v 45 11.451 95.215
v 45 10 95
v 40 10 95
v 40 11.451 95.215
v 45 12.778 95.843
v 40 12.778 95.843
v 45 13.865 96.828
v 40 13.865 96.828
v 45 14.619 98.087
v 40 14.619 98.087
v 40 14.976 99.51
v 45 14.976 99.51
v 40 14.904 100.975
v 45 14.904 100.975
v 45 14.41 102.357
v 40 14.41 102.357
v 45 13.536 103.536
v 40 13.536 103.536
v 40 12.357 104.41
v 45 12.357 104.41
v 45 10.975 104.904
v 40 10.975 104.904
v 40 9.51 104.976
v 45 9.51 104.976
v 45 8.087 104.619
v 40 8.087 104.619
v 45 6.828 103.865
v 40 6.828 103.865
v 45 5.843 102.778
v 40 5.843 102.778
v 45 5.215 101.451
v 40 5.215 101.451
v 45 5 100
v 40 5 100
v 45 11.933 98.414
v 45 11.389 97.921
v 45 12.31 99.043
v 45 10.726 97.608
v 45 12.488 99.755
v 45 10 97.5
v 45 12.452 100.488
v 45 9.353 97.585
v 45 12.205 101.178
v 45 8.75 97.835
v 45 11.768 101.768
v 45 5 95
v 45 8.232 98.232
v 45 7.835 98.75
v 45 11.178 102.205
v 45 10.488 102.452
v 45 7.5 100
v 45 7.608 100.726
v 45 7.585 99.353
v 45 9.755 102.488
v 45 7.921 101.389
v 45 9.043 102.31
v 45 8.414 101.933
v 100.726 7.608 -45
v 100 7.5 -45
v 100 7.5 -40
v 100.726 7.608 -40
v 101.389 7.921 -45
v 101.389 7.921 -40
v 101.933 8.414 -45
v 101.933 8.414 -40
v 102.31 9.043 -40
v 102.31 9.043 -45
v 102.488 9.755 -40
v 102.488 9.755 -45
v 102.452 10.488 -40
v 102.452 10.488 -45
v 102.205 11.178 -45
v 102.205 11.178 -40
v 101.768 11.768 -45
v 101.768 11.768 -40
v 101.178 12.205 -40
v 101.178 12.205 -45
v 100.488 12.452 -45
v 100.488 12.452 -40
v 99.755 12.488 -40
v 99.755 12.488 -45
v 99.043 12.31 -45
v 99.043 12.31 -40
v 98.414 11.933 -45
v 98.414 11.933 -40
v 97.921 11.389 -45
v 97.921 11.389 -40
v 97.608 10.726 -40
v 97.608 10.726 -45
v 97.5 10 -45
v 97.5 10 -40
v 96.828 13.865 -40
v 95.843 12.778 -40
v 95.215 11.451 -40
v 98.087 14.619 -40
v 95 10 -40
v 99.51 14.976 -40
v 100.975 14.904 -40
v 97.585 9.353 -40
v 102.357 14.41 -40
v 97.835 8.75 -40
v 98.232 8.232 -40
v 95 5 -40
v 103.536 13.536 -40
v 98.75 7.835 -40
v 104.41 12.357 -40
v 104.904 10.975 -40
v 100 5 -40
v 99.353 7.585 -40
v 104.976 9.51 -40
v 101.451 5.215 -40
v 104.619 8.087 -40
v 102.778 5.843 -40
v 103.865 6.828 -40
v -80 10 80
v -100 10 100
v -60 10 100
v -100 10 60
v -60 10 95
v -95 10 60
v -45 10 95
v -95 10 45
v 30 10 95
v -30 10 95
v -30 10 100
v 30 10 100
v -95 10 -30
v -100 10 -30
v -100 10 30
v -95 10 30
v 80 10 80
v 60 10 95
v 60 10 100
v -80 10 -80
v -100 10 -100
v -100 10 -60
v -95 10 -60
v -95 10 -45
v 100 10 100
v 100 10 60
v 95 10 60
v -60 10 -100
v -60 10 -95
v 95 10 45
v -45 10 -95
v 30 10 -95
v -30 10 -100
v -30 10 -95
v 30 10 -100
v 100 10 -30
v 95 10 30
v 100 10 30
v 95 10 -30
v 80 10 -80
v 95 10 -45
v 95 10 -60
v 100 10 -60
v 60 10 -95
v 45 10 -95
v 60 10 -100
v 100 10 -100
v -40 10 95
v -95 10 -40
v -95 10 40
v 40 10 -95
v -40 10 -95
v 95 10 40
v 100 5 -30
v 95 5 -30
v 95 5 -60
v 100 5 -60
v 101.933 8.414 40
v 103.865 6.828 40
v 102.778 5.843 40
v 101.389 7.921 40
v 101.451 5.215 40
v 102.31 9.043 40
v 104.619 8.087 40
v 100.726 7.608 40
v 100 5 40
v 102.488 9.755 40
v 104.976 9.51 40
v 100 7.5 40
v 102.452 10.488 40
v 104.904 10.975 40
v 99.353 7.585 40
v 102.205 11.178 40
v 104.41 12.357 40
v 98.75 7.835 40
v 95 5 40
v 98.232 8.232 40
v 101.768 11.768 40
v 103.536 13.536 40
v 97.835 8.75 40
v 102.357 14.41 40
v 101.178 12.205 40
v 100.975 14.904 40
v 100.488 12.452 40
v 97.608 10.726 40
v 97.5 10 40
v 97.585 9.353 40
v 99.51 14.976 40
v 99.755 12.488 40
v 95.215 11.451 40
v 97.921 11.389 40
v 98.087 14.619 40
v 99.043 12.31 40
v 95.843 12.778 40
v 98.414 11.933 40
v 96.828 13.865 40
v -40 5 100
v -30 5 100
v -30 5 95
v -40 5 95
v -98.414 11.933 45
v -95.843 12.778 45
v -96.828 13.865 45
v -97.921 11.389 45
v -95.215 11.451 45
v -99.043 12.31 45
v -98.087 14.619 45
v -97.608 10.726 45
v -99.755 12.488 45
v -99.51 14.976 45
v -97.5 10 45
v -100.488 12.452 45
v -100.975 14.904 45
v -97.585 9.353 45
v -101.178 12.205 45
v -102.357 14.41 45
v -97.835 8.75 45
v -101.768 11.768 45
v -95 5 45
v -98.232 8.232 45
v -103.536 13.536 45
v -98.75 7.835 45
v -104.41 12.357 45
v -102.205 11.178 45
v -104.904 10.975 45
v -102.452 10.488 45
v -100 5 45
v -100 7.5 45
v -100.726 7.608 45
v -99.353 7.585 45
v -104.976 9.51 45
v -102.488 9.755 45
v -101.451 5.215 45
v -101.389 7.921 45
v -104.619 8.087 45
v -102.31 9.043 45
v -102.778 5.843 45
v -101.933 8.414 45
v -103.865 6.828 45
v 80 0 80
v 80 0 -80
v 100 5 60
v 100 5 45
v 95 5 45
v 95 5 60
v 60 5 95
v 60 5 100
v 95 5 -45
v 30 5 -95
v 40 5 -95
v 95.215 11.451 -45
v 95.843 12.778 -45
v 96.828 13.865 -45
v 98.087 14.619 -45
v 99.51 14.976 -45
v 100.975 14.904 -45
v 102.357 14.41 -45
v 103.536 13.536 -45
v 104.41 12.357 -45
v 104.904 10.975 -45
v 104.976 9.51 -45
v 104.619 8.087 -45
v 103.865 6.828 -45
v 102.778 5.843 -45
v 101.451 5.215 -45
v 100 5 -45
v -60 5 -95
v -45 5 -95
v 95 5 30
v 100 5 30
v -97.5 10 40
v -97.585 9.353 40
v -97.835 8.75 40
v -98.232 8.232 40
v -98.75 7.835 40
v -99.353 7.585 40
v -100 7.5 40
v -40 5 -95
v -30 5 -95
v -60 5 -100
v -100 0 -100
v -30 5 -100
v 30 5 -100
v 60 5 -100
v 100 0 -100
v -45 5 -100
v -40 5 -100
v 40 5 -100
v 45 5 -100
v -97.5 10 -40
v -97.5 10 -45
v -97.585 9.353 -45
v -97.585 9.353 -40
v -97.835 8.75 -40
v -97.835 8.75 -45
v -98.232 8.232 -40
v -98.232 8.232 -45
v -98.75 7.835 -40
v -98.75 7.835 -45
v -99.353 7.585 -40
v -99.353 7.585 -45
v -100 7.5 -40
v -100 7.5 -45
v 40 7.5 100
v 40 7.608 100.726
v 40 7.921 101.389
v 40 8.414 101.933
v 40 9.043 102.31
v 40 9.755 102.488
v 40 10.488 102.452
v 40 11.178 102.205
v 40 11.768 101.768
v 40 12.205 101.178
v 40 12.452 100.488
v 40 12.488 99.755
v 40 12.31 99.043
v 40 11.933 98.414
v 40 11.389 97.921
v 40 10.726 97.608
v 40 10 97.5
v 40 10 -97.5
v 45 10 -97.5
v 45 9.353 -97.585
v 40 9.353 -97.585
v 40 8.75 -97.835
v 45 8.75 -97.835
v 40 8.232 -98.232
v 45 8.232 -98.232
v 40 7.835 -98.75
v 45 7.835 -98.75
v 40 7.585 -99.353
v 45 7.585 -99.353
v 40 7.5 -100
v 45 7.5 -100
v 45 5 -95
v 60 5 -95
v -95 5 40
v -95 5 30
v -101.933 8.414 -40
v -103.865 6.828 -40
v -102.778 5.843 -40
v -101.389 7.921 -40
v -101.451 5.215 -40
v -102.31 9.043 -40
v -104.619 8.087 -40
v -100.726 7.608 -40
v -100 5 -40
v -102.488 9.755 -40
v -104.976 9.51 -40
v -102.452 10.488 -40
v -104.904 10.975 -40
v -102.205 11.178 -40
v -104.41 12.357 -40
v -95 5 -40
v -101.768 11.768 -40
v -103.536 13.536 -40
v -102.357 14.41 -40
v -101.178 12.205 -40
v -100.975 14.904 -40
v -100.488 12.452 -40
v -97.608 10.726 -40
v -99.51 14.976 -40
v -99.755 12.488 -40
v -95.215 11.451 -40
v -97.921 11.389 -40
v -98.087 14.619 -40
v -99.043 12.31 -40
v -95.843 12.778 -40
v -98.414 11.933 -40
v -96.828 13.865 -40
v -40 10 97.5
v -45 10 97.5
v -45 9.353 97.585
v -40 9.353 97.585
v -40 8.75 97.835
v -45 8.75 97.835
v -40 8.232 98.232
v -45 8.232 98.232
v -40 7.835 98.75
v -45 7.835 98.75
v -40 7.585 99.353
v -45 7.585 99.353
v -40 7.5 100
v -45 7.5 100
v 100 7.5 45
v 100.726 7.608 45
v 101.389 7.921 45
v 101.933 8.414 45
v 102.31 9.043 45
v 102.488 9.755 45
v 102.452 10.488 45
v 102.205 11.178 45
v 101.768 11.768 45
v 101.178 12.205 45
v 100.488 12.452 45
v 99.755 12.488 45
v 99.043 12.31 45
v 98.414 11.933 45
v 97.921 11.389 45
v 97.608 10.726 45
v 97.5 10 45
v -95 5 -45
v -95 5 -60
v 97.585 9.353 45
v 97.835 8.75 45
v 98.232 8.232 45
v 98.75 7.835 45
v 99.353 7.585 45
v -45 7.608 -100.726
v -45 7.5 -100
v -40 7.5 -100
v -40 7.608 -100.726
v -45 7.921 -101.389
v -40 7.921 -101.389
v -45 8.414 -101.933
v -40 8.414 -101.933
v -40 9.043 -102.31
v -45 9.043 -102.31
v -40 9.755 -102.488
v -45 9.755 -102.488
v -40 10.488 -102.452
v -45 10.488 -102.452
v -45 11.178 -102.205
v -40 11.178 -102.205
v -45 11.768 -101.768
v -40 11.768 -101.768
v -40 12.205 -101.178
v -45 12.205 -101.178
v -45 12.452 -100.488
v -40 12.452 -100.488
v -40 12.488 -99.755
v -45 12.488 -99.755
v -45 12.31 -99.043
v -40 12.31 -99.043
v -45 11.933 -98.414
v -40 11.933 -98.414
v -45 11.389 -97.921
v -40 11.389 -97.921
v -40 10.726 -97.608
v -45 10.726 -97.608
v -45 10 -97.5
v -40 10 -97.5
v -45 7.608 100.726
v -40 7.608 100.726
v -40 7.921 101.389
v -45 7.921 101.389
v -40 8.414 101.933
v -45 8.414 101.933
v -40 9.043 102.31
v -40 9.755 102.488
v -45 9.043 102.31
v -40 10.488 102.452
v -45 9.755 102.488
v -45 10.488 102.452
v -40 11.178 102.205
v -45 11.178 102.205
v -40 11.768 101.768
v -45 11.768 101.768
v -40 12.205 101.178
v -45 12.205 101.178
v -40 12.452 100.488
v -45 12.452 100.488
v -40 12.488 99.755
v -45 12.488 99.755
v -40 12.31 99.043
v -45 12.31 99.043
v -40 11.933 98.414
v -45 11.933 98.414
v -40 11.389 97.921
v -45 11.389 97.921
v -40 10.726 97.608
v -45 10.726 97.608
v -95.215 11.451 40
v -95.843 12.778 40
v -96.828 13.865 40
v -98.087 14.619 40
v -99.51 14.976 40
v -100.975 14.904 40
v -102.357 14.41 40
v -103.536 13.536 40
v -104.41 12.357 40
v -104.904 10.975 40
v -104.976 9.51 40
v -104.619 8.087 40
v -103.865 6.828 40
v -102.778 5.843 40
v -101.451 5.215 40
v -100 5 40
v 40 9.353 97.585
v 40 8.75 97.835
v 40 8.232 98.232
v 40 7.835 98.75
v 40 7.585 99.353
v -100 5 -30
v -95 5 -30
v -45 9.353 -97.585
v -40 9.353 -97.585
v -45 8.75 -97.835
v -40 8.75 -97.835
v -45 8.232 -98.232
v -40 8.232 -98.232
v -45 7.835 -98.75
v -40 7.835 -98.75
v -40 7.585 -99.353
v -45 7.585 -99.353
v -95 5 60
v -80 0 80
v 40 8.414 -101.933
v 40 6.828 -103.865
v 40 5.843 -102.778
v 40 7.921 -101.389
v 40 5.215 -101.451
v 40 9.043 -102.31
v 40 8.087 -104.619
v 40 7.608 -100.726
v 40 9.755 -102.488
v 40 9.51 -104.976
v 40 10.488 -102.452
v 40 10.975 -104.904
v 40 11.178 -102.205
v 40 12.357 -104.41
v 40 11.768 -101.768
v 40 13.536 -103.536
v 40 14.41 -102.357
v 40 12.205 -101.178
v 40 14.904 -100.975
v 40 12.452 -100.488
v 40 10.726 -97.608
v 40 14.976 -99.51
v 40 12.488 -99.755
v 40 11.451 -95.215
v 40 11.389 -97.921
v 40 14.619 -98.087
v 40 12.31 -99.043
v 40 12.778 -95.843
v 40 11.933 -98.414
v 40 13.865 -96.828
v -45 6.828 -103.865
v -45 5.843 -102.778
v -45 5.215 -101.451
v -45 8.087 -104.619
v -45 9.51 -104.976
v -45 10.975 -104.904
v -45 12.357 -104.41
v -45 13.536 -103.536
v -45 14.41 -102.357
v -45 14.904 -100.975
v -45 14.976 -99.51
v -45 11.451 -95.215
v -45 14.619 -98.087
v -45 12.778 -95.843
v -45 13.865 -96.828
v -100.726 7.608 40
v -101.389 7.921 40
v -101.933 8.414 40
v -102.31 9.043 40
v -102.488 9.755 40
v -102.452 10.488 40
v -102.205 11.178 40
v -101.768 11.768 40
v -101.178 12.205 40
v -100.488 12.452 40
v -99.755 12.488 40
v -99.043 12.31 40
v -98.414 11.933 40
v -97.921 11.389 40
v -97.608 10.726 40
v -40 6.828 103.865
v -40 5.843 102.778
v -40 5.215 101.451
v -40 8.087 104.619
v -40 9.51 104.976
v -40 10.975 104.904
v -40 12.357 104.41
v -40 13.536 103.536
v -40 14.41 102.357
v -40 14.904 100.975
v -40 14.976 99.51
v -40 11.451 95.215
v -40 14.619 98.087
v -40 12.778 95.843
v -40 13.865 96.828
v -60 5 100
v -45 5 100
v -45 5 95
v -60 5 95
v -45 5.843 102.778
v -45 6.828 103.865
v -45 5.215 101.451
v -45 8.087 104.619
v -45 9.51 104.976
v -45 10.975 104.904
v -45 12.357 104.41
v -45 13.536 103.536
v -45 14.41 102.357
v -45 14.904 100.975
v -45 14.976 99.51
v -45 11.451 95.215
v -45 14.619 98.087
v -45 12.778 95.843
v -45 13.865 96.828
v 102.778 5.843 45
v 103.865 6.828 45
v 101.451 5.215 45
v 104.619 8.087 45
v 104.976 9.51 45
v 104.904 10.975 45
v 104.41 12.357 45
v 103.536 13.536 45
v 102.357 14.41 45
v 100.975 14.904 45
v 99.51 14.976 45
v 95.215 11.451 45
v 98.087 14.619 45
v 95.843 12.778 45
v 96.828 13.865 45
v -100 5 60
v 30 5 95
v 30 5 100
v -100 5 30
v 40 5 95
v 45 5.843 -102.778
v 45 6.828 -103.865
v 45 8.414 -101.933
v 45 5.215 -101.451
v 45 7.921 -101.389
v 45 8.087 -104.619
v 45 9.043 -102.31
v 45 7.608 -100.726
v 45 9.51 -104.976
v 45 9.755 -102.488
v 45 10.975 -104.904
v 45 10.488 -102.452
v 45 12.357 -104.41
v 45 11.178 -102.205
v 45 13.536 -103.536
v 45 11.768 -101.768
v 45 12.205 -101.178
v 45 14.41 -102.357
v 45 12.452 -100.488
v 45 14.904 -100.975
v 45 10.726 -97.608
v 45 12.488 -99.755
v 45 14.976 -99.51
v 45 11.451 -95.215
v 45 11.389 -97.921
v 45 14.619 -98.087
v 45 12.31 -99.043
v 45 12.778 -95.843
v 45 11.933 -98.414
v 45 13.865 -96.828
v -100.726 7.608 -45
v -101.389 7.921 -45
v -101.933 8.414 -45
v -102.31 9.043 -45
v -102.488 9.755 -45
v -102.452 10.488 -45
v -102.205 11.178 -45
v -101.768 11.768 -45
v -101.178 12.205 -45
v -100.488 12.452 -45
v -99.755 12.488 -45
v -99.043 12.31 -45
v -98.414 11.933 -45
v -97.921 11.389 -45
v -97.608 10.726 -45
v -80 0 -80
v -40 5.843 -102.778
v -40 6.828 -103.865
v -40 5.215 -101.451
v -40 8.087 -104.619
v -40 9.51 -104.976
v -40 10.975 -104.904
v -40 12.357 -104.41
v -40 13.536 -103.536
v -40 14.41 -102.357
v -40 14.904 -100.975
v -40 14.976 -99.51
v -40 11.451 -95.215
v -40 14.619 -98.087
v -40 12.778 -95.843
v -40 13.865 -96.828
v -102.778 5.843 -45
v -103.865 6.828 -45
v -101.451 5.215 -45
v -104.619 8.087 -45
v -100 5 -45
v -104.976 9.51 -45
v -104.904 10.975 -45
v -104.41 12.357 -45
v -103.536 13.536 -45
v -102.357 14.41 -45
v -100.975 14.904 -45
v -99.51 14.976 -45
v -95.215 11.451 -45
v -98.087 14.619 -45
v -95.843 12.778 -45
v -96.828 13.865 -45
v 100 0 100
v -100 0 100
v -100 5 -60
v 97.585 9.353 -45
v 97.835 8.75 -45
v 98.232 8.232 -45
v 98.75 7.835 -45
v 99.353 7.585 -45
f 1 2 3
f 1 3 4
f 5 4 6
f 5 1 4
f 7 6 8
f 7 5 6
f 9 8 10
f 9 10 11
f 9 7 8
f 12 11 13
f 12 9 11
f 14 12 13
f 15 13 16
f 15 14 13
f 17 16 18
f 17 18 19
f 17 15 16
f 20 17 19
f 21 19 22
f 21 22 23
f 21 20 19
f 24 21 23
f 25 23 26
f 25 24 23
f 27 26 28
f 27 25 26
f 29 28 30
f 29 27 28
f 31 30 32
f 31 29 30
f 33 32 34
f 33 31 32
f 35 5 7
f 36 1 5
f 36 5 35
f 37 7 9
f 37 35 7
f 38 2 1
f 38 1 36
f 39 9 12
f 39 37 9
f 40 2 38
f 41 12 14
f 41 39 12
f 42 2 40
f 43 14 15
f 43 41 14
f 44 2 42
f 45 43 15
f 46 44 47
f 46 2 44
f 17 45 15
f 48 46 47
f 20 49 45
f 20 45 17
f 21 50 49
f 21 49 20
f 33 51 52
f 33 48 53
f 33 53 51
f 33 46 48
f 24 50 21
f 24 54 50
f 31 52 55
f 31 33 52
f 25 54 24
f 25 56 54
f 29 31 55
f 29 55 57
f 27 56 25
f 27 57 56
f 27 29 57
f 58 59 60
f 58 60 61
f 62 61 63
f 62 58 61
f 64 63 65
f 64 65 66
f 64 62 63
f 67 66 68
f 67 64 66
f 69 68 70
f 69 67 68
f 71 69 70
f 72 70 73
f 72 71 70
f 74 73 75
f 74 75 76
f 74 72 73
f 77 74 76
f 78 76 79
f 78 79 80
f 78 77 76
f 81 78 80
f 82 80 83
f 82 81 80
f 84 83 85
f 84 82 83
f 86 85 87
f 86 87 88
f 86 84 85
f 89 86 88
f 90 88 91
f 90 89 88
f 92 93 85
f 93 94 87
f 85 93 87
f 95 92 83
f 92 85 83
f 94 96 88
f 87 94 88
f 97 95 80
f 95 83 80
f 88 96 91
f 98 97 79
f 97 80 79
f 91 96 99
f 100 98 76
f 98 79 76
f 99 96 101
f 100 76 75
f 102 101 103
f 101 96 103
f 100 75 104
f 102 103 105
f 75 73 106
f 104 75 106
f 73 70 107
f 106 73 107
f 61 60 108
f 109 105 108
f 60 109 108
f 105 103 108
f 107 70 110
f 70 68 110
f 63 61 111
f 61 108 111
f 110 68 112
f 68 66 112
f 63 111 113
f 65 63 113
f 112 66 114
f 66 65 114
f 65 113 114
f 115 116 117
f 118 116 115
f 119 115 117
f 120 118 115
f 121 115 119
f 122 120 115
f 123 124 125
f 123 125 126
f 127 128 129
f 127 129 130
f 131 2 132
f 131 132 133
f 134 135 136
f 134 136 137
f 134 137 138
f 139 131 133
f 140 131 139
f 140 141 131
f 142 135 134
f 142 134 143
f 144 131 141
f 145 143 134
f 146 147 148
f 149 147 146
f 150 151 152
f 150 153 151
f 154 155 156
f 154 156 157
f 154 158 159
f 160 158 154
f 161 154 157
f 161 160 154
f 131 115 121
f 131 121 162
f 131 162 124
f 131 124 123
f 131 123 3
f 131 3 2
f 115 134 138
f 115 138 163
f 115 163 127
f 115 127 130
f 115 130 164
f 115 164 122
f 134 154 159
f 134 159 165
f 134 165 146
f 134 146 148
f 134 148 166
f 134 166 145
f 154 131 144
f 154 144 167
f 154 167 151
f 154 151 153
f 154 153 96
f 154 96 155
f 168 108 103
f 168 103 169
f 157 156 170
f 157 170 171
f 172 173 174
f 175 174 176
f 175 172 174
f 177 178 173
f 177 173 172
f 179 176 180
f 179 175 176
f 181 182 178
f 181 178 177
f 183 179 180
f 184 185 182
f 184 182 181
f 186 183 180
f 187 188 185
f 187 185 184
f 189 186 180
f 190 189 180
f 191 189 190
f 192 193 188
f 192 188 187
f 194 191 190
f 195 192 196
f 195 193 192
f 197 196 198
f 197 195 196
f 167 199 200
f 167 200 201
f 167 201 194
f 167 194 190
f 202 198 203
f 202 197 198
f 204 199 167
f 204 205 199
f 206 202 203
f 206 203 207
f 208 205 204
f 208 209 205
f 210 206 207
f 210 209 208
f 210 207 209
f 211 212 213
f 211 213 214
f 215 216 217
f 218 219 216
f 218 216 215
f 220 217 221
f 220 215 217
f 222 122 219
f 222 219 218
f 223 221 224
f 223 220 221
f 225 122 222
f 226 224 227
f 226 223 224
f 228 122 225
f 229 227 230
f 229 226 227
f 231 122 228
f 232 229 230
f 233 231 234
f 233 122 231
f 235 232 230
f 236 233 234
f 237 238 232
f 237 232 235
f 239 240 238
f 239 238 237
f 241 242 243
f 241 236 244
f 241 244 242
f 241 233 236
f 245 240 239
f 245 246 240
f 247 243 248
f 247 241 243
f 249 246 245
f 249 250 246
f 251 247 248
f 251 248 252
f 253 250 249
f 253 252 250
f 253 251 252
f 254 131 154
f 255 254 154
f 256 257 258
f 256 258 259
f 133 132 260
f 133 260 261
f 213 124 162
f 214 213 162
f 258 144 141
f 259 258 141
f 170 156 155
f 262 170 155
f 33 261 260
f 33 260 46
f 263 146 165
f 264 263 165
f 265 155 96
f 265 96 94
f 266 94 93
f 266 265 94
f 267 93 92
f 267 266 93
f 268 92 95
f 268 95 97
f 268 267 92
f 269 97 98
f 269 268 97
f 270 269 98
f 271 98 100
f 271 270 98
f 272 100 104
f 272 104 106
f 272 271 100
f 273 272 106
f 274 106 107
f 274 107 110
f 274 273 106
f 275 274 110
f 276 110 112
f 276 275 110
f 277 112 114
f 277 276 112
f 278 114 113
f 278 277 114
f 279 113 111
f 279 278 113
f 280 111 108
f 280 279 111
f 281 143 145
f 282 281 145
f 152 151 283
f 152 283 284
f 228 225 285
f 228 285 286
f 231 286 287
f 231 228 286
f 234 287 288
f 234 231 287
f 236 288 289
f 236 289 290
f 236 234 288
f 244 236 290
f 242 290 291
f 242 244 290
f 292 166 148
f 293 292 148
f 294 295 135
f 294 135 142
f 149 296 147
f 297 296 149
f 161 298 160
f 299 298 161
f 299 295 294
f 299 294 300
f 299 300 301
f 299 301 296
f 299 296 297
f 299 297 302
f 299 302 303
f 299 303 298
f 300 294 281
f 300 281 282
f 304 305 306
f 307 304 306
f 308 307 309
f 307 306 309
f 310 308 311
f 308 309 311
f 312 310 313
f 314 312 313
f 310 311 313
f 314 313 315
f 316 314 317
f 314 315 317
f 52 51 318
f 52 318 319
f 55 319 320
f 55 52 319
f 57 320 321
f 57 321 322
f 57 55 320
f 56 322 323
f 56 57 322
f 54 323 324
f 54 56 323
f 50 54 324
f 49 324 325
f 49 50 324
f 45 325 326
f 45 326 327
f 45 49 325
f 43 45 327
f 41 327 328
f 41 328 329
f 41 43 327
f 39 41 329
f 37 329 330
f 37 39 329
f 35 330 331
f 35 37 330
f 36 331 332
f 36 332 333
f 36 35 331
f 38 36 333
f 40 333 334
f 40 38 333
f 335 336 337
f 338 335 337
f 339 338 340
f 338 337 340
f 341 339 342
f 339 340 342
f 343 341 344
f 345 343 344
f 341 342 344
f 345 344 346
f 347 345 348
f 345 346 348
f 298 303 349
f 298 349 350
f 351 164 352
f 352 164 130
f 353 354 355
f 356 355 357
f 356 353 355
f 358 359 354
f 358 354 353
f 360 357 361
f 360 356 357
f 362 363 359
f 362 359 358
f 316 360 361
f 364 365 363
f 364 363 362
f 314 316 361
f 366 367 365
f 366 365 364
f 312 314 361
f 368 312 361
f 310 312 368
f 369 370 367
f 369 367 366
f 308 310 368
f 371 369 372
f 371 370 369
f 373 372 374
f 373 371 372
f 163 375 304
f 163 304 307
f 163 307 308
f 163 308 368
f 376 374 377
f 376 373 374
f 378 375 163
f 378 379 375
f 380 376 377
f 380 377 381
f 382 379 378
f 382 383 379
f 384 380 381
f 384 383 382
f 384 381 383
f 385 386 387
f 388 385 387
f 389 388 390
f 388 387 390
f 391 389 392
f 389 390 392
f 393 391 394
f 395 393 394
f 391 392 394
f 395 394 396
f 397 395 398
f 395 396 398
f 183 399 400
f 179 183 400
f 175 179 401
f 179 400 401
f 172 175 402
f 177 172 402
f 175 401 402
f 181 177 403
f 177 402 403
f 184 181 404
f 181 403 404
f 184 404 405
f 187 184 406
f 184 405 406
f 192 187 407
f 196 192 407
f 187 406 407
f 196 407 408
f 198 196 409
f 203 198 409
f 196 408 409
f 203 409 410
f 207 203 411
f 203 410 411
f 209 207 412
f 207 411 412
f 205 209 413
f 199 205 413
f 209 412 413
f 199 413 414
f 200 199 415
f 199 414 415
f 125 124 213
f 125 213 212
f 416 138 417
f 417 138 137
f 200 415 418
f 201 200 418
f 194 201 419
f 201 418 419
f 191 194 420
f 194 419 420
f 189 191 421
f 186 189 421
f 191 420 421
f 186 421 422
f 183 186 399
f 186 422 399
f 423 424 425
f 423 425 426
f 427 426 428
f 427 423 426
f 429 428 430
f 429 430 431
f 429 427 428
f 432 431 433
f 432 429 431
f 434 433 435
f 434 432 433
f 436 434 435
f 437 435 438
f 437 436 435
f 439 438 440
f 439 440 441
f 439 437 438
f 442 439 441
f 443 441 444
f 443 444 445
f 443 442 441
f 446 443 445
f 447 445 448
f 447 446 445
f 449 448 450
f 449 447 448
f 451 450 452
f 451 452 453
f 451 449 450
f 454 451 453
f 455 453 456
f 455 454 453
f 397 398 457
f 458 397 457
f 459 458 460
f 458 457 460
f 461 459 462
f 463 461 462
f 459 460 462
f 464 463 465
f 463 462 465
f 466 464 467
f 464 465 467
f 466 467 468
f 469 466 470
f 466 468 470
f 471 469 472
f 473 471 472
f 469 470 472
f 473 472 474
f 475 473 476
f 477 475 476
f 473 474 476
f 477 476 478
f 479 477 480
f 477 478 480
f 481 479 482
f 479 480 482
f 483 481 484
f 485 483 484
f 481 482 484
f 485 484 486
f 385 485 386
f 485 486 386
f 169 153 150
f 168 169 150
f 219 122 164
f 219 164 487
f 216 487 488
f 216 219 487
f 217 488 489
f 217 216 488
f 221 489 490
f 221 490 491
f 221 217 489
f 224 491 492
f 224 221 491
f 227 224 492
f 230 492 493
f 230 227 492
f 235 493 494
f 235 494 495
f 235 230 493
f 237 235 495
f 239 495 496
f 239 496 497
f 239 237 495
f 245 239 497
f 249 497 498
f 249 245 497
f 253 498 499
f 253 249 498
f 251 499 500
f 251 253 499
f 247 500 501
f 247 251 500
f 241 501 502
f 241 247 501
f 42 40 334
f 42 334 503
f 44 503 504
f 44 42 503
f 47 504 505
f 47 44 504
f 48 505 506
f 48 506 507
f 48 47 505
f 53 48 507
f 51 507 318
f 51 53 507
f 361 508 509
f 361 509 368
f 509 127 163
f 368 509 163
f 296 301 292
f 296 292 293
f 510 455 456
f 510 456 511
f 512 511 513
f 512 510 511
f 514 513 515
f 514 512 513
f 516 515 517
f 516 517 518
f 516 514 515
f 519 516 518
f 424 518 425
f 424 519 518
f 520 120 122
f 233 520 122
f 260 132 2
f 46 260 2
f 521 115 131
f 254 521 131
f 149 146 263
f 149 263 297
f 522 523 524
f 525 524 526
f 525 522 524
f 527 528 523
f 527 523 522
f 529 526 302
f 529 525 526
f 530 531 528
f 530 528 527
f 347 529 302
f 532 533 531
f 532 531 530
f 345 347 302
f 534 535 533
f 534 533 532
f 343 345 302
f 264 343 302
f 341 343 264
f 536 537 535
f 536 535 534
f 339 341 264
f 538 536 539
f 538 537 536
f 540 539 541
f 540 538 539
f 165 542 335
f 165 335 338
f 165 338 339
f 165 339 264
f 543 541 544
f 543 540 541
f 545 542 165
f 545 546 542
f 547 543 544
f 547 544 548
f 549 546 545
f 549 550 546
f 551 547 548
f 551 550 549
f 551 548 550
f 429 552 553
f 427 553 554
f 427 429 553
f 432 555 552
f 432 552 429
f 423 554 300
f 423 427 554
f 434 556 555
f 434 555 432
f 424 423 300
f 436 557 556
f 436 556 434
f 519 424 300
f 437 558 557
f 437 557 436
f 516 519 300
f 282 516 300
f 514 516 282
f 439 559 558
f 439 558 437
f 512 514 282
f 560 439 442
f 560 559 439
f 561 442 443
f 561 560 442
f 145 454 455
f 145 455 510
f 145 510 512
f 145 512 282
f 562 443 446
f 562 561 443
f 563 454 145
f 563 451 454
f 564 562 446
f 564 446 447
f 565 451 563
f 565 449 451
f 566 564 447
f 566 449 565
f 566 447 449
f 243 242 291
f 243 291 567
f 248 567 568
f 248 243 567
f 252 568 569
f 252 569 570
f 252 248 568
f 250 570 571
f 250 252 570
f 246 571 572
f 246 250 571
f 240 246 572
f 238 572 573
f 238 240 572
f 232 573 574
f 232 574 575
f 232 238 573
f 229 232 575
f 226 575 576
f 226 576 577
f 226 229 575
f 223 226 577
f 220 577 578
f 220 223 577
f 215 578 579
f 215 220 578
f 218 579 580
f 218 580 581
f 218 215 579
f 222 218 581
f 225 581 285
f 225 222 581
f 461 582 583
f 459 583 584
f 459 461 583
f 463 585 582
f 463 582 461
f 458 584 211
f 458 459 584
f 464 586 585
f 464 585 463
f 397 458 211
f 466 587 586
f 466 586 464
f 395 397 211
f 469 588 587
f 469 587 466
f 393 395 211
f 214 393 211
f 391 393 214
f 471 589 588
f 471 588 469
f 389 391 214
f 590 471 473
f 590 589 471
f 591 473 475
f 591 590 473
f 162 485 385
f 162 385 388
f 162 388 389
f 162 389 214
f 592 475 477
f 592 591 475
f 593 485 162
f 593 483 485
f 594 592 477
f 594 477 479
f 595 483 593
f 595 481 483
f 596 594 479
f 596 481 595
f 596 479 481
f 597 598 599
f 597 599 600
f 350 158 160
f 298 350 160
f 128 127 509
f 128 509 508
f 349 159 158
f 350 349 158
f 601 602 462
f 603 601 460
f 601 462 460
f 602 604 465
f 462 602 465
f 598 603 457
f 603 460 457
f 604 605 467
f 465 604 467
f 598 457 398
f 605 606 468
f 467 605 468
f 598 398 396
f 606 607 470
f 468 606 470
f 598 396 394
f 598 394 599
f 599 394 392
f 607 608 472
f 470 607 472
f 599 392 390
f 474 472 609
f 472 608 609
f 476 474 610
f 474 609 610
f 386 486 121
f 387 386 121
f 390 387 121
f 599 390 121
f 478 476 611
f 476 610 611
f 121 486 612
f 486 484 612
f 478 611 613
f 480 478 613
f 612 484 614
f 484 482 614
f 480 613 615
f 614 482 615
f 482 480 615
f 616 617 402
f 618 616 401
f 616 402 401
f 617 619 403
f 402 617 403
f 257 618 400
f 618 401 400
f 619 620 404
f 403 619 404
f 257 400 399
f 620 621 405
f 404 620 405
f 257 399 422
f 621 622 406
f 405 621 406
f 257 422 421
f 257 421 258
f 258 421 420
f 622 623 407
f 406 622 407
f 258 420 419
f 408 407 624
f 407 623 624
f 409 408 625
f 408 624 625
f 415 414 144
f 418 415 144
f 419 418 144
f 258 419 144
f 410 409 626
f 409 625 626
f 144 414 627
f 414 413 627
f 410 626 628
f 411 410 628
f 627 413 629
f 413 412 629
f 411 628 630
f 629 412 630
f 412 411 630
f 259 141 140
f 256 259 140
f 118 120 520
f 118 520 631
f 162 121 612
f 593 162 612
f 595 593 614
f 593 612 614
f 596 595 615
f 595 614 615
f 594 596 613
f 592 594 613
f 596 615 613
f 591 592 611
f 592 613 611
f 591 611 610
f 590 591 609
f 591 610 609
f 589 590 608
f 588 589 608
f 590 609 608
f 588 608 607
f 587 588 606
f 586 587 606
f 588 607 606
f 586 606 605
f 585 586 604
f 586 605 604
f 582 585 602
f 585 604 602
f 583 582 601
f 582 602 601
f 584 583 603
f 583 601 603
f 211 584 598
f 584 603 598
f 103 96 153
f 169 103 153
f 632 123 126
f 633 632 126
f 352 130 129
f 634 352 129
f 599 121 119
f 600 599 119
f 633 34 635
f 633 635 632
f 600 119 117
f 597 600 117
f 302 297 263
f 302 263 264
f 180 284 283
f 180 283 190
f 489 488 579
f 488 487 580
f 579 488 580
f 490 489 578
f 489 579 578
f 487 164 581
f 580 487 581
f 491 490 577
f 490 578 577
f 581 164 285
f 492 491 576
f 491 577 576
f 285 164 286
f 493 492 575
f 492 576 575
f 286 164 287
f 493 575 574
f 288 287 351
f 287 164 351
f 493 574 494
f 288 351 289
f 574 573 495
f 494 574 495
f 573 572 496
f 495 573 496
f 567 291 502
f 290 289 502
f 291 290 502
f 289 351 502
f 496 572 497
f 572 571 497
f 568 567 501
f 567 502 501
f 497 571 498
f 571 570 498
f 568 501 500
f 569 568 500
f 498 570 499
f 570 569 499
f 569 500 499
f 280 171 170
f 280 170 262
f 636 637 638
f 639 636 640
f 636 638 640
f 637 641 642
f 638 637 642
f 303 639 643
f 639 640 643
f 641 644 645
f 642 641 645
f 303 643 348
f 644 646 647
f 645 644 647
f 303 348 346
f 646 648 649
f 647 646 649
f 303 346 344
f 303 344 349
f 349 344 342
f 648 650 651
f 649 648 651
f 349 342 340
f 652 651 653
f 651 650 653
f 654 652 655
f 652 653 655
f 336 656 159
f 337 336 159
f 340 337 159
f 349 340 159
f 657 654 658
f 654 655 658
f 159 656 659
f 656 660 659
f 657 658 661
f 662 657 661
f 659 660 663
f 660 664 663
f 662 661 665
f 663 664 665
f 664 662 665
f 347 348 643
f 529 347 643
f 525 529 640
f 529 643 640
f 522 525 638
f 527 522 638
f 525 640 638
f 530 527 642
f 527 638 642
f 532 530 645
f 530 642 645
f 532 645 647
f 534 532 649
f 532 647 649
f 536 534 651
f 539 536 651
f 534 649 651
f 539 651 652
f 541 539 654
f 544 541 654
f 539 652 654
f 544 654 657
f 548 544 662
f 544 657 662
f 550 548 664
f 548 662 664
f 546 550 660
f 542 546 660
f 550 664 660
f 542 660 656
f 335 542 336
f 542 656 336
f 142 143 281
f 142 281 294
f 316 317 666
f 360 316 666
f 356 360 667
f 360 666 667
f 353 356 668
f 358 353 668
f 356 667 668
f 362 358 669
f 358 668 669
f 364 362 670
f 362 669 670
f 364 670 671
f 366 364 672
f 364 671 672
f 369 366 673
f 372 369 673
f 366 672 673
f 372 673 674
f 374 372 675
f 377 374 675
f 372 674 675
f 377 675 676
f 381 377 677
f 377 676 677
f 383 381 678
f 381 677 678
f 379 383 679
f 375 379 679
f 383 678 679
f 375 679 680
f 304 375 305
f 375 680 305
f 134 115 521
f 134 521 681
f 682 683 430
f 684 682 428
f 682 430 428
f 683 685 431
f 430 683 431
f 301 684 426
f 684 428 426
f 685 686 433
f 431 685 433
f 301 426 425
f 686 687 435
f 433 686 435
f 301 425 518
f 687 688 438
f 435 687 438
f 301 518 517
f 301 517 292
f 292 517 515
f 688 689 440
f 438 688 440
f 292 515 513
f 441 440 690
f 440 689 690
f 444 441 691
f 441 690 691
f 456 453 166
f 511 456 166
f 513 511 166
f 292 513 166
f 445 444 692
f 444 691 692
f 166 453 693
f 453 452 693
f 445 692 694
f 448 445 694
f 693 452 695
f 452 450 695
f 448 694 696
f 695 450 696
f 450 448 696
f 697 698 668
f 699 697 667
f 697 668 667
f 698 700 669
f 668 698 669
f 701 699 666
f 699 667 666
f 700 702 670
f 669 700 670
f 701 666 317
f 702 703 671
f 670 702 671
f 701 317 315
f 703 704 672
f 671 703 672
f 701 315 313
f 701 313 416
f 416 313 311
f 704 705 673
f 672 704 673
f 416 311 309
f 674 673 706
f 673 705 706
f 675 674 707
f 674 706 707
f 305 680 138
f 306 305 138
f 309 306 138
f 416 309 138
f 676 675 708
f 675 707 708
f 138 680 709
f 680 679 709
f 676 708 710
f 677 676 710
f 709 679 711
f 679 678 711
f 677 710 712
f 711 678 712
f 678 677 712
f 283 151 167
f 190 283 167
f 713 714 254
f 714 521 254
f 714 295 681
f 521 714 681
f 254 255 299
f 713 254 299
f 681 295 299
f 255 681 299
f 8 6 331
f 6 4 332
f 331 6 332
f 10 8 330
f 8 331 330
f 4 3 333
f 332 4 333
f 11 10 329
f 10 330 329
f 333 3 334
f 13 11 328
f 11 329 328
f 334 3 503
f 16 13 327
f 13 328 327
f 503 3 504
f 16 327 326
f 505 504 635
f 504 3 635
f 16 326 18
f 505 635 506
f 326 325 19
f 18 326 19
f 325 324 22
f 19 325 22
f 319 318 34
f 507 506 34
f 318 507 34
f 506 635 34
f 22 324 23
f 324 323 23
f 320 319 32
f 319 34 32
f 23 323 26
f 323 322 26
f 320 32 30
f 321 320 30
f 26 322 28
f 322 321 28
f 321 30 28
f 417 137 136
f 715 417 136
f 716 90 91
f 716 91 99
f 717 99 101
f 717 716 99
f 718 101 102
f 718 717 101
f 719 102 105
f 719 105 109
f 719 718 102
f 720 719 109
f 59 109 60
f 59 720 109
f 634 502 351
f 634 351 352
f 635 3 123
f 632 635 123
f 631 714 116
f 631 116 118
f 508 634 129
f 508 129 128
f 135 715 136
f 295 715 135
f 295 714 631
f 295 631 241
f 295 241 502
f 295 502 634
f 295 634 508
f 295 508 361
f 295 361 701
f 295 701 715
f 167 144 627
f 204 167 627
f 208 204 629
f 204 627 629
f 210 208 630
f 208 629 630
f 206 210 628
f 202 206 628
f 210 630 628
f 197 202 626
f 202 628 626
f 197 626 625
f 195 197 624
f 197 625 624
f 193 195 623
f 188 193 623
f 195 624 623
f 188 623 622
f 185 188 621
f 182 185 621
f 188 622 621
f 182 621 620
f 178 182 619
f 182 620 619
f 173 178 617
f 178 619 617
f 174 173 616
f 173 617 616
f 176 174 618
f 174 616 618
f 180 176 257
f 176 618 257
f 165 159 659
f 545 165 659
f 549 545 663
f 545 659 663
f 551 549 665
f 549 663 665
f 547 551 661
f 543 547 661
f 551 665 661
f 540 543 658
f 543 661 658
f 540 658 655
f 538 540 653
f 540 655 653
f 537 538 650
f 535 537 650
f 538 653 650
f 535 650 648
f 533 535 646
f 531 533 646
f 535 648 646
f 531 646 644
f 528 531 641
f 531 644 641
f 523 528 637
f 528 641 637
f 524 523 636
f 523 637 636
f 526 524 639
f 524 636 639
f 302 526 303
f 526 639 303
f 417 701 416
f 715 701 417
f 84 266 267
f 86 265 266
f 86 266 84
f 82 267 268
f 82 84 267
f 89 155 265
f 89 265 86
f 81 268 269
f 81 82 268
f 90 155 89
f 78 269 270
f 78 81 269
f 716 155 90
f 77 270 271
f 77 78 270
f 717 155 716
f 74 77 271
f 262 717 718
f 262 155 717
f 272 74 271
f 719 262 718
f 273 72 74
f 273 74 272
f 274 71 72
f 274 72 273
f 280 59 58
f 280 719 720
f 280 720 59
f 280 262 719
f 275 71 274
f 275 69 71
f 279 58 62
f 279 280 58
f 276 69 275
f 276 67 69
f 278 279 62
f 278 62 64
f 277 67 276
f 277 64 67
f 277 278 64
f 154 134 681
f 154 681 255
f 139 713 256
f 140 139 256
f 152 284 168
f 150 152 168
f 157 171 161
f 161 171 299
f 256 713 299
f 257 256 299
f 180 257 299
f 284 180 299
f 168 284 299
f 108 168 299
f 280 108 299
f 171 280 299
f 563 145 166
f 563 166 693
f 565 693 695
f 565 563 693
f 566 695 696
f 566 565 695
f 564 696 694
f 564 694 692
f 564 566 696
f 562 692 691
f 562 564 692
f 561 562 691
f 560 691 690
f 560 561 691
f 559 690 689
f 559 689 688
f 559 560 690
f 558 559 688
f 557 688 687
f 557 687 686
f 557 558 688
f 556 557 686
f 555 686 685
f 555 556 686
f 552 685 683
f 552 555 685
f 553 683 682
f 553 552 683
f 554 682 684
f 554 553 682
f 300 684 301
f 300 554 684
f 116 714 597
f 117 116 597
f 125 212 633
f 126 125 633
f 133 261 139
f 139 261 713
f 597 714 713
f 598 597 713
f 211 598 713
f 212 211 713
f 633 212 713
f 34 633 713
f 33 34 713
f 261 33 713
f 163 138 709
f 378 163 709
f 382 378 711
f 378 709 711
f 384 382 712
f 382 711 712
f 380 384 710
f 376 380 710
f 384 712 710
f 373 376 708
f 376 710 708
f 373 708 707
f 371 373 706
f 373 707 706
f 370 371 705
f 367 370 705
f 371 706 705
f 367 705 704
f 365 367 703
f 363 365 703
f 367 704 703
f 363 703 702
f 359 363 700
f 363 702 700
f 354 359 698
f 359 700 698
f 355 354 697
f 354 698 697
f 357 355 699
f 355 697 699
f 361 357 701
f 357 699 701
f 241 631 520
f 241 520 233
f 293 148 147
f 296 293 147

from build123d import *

# Parameters (mm, degrees)
SKETCH1_W                = 200
SKETCH1_H                = 200
SKETCH1_R                = 0.0005
BOSS_EXTRUDE1_DEPTH      = 10
SKETCH2_W                = 30
SKETCH2_H                = 5
CUT_EXTRUDE1_DEPTH       = 5
BOSS_EXTRUDE3_START      = 15
BOSS_EXTRUDE3_DEPTH      = 5
CIRPATTERN1_COUNT        = 4
CIRPATTERN1_START        = 15
CIRPATTERN1_COPY_1_DEPTH = 5
CIRPATTERN1_COPY_2_DEPTH = 5
CIRPATTERN1_COPY_3_DEPTH = 5
SKETCH4_W                = 160
SKETCH4_H                = 160
CUT_EXTRUDE2_DEPTH       = 10


with BuildPart() as part:
    # Sketch1 → Boss-Extrude1 (new body)
    with BuildSketch(Plane(origin=(0, 0, 0), x_dir=(1, 0, 0), z_dir=(0, 1, 0))):
        Rectangle(SKETCH1_W, SKETCH1_H)
        with Locations(Location((0, 0, 0), (0, 0, 270))):
            Circle(SKETCH1_R, mode=Mode.SUBTRACT)
    extrude(amount=BOSS_EXTRUDE1_DEPTH)

    # Sketch2 → Cut-Extrude1 (cut)
    with BuildSketch(Plane(origin=(0, 10, 0), x_dir=(1, 0, 0), z_dir=(0, 1, 0))):
        with Locations((45, 97.5)):
            Rectangle(SKETCH2_W, SKETCH2_H)
        with Locations((-45, 97.5)):
            Rectangle(SKETCH2_W, SKETCH2_H)
    cut_extrude1 = extrude(amount=-CUT_EXTRUDE1_DEPTH, mode=Mode.SUBTRACT)

    # Sketch3 → Boss-Extrude3 (add)
    with BuildSketch(Plane.ZY.offset(-60).offset(BOSS_EXTRUDE3_START)):
        with BuildLine():
            Line((-97.5, 10), (-95, 10))
            ThreePointArc((-95, 10), (-103.535533906, 13.535533906), (-100, 5))
            Line((-100, 5), (-100, 7.5))
            ThreePointArc((-100, 7.5), (-101.767766953, 11.767766953), (-97.5, 10))
        make_face()
        with BuildLine():
            ThreePointArc((-100, 5), (-96.464466094, 6.464466094), (-95, 10))
            Line((-95, 10), (-97.5, 10))
            ThreePointArc((-97.5, 10), (-98.232233047, 8.232233047), (-100, 7.5))
            Line((-100, 7.5), (-100, 5))
        make_face()
        with BuildLine():
            Line((-95, 5), (-95, 10))
            ThreePointArc((-95, 10), (-96.464466094, 6.464466094), (-100, 5))
            Line((-100, 5), (-95, 5))
        make_face()
    boss_extrude3 = extrude(amount=BOSS_EXTRUDE3_DEPTH)

    # Mirror1: Boss-Extrude3 across plane
    add(boss_extrude3.mirror(Plane(origin=(0, 0, 0), x_dir=(0, 0, 1), z_dir=(1, 0, 0))))

    # CirPattern1: Cut-Extrude1, Boss-Extrude3 ×4 about axis
    cirpattern1_axis = Axis((0, 0, 0), (0, 1, 0))
    add([cut_extrude1.rotate(cirpattern1_axis, i * 360 / CIRPATTERN1_COUNT) for i in range(1, CIRPATTERN1_COUNT)], mode=Mode.SUBTRACT)
    add([boss_extrude3.rotate(cirpattern1_axis, i * 360 / CIRPATTERN1_COUNT) for i in range(1, CIRPATTERN1_COUNT)])

    # CirPattern1 copy 1 sketch → CirPattern1 copy 1 (add)
    with BuildSketch(Plane(origin=(0, 0, 60), x_dir=(1, 0, 0), z_dir=(0, 0, -1)).offset(CIRPATTERN1_START)):
        with BuildLine():
            Line((-97.5, -10), (-95, -10))
            ThreePointArc((-95, -10), (-103.535533906, -13.535533906), (-100, -5))
            Line((-100, -5), (-100, -7.5))
            ThreePointArc((-100, -7.5), (-101.767766953, -11.767766953), (-97.5, -10))
        make_face()
        with BuildLine():
            ThreePointArc((-100, -5), (-96.464466094, -6.464466094), (-95, -10))
            Line((-95, -10), (-97.5, -10))
            ThreePointArc((-97.5, -10), (-98.232233047, -8.232233047), (-100, -7.5))
            Line((-100, -7.5), (-100, -5))
        make_face()
        with BuildLine():
            Line((-95, -5), (-95, -10))
            ThreePointArc((-95, -10), (-96.464466094, -6.464466094), (-100, -5))
            Line((-100, -5), (-95, -5))
        make_face()
    extrude(amount=CIRPATTERN1_COPY_1_DEPTH)

    # CirPattern1 copy 2 sketch → CirPattern1 copy 2 (add)
    with BuildSketch(Plane(origin=(60, 0, 0), x_dir=(0, 0, -1), z_dir=(-1, 0, 0)).offset(CIRPATTERN1_START)):
        with BuildLine():
            Line((-97.5, -10), (-95, -10))
            ThreePointArc((-95, -10), (-103.535533906, -13.535533906), (-100, -5))
            Line((-100, -5), (-100, -7.5))
            ThreePointArc((-100, -7.5), (-101.767766953, -11.767766953), (-97.5, -10))
        make_face()
        with BuildLine():
            ThreePointArc((-100, -5), (-96.464466094, -6.464466094), (-95, -10))
            Line((-95, -10), (-97.5, -10))
            ThreePointArc((-97.5, -10), (-98.232233047, -8.232233047), (-100, -7.5))
            Line((-100, -7.5), (-100, -5))
        make_face()
        with BuildLine():
            Line((-95, -5), (-95, -10))
            ThreePointArc((-95, -10), (-96.464466094, -6.464466094), (-100, -5))
            Line((-100, -5), (-95, -5))
        make_face()
    extrude(amount=CIRPATTERN1_COPY_2_DEPTH)

    # CirPattern1 copy 3 sketch → CirPattern1 copy 3 (add)
    with BuildSketch(Plane(origin=(0, 0, -60), x_dir=(-1, 0, 0), z_dir=(0, 0, 1)).offset(CIRPATTERN1_START)):
        with BuildLine():
            Line((-97.5, -10), (-95, -10))
            ThreePointArc((-95, -10), (-103.535533906, -13.535533906), (-100, -5))
            Line((-100, -5), (-100, -7.5))
            ThreePointArc((-100, -7.5), (-101.767766953, -11.767766953), (-97.5, -10))
        make_face()
        with BuildLine():
            ThreePointArc((-100, -5), (-96.464466094, -6.464466094), (-95, -10))
            Line((-95, -10), (-97.5, -10))
            ThreePointArc((-97.5, -10), (-98.232233047, -8.232233047), (-100, -7.5))
            Line((-100, -7.5), (-100, -5))
        make_face()
        with BuildLine():
            Line((-95, -5), (-95, -10))
            ThreePointArc((-95, -10), (-96.464466094, -6.464466094), (-100, -5))
            Line((-100, -5), (-95, -5))
        make_face()
    extrude(amount=CIRPATTERN1_COPY_3_DEPTH)

    # Sketch4 → Cut-Extrude2 (cut)
    with BuildSketch(Plane(origin=(0, 10, 0), x_dir=(1, 0, 0), z_dir=(0, 1, 0))):
        Rectangle(SKETCH4_W, SKETCH4_H)
    extrude(amount=-CUT_EXTRUDE2_DEPTH, mode=Mode.SUBTRACT)


solid = part.part
